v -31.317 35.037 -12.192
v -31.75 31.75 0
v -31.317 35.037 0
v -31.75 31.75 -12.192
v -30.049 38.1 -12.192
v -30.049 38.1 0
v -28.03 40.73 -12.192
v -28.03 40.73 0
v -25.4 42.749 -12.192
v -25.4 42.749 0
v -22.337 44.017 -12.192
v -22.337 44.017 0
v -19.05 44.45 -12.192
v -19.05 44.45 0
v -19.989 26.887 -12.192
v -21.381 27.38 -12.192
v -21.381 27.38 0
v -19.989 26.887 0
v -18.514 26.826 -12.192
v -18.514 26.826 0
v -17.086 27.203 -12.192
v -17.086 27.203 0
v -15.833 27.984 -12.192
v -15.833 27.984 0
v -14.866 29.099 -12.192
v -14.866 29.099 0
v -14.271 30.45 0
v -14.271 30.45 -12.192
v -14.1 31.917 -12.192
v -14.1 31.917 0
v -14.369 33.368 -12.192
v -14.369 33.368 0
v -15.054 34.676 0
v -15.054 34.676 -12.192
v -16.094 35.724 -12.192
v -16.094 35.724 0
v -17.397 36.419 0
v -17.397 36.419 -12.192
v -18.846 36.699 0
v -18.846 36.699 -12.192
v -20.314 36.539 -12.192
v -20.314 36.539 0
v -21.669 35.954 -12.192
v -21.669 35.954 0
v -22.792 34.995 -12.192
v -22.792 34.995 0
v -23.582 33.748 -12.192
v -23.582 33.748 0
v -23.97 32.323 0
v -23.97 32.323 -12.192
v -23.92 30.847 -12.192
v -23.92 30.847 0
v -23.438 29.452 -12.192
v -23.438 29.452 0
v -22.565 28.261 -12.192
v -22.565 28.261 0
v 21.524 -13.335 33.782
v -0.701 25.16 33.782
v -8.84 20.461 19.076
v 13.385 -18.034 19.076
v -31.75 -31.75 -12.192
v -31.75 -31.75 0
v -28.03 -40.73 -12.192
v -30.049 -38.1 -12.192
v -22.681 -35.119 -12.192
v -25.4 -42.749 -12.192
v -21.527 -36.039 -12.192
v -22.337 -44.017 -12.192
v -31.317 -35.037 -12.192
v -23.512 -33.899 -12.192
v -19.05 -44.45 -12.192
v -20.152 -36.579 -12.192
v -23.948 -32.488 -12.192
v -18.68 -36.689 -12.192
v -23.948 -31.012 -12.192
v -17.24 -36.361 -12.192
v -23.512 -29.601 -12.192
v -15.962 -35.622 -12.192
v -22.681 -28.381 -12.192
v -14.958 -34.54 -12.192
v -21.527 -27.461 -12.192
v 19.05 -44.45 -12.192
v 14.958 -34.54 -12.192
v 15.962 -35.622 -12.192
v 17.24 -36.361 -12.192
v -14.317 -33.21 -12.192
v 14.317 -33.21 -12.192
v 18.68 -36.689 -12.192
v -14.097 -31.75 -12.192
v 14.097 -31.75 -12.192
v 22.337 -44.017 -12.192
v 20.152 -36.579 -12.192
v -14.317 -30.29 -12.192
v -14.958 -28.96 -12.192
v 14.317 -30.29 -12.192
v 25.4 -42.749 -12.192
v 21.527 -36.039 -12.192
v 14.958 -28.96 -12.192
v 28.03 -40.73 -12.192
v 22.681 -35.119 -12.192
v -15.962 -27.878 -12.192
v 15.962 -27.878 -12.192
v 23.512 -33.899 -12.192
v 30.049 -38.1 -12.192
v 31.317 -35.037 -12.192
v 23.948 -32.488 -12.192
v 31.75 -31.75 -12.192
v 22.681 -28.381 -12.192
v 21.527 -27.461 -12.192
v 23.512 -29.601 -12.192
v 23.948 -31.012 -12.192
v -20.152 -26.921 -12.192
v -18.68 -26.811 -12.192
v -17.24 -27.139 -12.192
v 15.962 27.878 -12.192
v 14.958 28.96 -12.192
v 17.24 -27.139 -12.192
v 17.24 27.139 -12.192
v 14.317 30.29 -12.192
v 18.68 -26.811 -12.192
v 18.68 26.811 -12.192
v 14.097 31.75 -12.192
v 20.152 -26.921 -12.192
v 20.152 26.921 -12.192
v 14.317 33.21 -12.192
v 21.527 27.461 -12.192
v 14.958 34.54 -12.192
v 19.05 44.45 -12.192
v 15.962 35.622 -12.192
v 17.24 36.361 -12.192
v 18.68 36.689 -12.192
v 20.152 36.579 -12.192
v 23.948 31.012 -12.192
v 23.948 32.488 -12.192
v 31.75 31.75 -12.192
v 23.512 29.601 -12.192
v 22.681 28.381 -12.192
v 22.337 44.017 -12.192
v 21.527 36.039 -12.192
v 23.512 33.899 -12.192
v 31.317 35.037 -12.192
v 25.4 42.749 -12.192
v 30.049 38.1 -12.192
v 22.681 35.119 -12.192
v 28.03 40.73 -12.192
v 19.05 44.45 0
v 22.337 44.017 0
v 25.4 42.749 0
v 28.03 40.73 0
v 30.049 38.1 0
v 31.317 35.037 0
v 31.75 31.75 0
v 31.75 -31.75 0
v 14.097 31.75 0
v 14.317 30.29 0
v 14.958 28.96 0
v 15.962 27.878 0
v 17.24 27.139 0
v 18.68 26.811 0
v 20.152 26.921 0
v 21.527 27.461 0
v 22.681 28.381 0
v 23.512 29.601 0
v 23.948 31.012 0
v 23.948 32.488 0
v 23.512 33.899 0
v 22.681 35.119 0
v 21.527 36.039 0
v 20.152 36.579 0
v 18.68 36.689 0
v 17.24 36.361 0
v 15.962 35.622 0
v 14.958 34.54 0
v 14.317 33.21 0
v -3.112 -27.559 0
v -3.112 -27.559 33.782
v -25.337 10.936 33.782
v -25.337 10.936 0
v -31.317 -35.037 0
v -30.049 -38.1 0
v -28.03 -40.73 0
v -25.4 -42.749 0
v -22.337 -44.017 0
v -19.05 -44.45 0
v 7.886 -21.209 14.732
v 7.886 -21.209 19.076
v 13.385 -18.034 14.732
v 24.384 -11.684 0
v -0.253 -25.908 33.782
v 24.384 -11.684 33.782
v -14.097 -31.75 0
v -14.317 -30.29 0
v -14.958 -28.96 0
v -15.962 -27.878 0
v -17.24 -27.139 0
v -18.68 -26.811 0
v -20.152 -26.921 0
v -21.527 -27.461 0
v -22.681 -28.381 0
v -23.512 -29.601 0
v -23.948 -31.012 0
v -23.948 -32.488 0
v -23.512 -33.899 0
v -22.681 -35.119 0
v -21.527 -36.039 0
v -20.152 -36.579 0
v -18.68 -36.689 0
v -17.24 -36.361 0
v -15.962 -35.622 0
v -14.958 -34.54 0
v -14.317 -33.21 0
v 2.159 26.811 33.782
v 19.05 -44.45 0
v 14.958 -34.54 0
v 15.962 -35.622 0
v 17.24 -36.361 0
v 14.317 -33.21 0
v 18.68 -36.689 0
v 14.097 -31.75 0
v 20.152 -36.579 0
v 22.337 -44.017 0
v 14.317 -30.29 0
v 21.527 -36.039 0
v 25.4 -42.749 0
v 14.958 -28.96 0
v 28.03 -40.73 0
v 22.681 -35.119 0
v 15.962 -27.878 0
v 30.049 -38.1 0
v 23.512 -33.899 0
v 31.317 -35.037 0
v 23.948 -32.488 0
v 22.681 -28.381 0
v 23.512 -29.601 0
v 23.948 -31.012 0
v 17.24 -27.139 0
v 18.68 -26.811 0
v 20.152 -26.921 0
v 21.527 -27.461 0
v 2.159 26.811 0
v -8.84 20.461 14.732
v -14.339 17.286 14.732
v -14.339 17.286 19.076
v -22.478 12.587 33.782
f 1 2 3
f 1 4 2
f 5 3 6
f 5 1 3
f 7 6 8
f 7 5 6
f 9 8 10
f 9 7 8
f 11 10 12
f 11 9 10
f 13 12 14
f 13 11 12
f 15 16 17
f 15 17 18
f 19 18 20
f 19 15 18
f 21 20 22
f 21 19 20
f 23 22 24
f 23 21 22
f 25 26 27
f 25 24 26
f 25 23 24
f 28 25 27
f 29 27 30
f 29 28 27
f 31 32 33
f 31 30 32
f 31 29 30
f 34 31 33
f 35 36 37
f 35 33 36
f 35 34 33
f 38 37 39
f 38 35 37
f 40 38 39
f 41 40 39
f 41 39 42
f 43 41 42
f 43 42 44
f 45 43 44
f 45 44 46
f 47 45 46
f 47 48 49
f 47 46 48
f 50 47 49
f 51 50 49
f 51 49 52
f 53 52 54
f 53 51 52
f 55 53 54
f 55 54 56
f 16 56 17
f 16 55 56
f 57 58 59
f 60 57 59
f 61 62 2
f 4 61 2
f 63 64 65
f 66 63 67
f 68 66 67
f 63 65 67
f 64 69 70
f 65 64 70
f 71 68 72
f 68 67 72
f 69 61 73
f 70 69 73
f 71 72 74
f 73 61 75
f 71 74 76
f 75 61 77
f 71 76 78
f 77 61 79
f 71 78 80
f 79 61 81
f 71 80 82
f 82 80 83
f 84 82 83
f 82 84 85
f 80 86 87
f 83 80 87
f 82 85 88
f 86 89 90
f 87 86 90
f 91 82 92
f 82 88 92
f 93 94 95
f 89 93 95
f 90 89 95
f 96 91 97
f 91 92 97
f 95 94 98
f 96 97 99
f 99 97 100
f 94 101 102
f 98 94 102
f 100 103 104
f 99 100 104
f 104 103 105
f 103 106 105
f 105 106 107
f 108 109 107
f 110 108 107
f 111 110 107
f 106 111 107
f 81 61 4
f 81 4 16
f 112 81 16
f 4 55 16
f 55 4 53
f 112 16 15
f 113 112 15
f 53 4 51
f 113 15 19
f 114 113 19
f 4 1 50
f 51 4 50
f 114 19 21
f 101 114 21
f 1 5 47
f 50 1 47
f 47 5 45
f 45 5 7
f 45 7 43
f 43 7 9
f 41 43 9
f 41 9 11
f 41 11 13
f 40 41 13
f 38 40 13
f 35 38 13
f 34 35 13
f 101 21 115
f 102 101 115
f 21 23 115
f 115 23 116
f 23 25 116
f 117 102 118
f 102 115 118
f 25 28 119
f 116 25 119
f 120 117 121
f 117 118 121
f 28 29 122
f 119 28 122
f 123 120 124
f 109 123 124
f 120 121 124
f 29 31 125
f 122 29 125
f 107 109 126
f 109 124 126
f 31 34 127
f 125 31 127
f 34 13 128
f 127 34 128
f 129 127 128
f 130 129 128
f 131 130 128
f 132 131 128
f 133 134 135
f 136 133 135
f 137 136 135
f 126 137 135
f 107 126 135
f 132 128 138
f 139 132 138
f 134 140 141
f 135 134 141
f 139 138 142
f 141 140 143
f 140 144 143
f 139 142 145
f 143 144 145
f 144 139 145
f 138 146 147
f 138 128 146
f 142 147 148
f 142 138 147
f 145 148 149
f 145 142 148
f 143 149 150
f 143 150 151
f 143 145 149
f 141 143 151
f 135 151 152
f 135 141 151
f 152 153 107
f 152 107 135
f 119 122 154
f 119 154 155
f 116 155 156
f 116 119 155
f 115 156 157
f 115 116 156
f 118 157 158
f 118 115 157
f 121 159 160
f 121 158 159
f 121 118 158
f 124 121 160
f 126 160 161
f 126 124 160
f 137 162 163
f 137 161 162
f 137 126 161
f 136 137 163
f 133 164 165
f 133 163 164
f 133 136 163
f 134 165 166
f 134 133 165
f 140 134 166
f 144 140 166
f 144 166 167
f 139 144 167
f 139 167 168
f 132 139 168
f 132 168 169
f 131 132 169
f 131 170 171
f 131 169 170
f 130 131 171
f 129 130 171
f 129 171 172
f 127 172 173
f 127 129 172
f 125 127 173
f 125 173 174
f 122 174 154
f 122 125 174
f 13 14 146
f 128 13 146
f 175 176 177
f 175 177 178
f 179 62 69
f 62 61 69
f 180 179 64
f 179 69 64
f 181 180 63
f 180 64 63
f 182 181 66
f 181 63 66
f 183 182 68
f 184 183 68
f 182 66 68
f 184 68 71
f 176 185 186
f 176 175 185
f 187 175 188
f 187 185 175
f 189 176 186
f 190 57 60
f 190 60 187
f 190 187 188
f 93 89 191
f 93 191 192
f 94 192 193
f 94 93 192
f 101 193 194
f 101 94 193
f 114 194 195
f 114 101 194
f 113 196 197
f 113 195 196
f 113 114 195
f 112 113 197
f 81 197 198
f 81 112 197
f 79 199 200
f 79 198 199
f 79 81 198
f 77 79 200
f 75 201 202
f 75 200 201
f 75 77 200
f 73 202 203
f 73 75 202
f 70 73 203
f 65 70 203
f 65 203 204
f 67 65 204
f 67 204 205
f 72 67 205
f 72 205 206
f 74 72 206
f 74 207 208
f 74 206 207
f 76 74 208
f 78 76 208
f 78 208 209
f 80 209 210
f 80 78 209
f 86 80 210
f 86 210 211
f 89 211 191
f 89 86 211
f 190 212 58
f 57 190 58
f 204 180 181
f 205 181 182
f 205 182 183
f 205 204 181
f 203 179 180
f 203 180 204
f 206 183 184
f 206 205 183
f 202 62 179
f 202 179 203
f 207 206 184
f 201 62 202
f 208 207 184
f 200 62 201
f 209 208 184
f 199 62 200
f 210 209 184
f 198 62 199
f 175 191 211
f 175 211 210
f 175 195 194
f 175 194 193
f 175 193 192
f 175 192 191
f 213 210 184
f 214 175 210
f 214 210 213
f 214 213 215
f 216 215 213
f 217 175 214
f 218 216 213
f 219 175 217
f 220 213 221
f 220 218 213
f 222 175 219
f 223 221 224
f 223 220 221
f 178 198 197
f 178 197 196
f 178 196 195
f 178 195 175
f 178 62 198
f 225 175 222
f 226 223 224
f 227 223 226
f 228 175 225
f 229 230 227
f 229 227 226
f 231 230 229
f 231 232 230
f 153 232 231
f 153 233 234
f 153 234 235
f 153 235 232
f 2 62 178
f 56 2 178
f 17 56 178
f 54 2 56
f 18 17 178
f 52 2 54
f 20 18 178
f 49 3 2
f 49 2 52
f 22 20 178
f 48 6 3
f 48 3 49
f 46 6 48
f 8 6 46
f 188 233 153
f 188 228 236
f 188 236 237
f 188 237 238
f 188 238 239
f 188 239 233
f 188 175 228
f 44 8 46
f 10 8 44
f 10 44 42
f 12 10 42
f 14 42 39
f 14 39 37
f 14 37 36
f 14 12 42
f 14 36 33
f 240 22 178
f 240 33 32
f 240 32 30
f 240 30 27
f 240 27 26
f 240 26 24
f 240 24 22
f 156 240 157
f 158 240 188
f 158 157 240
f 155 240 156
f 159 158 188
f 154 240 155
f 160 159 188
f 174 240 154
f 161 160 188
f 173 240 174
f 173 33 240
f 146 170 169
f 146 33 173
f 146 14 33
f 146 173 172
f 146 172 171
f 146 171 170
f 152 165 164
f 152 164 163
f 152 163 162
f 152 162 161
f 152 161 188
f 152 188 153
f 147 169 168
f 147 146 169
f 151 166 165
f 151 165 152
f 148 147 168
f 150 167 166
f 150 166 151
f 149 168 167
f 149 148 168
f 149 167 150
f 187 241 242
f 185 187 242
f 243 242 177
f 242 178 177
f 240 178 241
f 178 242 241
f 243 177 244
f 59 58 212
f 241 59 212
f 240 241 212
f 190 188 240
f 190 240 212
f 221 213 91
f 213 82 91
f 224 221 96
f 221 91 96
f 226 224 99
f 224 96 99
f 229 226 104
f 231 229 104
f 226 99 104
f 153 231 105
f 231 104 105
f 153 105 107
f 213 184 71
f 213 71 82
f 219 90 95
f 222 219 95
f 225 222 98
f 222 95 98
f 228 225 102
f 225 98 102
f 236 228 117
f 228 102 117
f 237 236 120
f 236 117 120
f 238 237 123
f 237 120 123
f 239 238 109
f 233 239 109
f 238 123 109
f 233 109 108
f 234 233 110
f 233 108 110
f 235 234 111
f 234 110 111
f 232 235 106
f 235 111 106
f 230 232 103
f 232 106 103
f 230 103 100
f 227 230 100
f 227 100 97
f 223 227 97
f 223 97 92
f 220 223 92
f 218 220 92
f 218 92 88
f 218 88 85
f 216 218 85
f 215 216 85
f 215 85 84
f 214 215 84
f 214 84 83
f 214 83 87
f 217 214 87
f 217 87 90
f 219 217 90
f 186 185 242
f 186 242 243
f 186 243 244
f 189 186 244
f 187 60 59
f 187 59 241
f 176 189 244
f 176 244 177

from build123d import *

# Parameters (mm, degrees)
F0_W     = 63.5
F0_H     = 88.9
F1_DEPTH = 12.192
F2_D     = 9.906
F6_DEPTH = 44.45
F7_R     = 12.7


# Not quite as in the source:
# - a pattern or mirror of a feature is missing from the dataset's text; its kind, count and spacing are read off the source's solid


with BuildPart() as f1:
    # F0 (on Top) → F1 (new body)
    with BuildSketch(Plane.XY):
        Rectangle(F0_W, F0_H)
    extrude(amount=-F1_DEPTH)

    # F2 (through all)
    with Locations(Plane.XY):
        with Locations((19.05, -31.75)):
            f2 = Hole(F2_D / 2)

    # F2_copies: F2 across plane
    add(f2.mirror(Plane(origin=(0, 0, 0), x_dir=(0.8574929257, 0.5144957554, 0), z_dir=(-0.5144957554, 0.8574929257, 0))), mode=Mode.SUBTRACT)

    # F2_copies1: F2 across plane
    add(f2.mirror(Plane(origin=(0, 0, 0), x_dir=(0, 0, -1), z_dir=(-1, 0, 0))), mode=Mode.SUBTRACT)

    # F2_copies2: F2 across plane
    add(f2.mirror(Plane.ZX), mode=Mode.SUBTRACT)

    # F5 (on line) → F6 (join, through all)
    with BuildSketch(Plane(origin=(11.1553204089, -19.3215817229, 0), x_dir=(0.8660254038, 0.5, 0), z_dir=(0.5, -0.8660254038, 0))):
        Polygon((-16.4748365541, 33.782), (-16.4748365541, 0), (15.2751634459, 0), (15.2751634459, 33.782), (11.9731634459, 33.782), (2.5751634459, 19.0759231813), (2.5751634459, 14.732), (-3.7748365541, 14.732), (-3.7748365541, 19.0759231813), (-13.1728365541, 33.782), align=None)
    extrude(amount=-F6_DEPTH)

    # F7
    f7_edges = [f1.edges().sort_by_distance(p)[0] for p in [
        (31.75, -44.45, -6.096),
        (31.75, 44.45, -6.096),
        (-31.75, 44.45, -6.096),
        (-31.75, -44.45, -6.096),
    ]]
    fillet(f7_edges, radius=F7_R)


solid = f1.part
